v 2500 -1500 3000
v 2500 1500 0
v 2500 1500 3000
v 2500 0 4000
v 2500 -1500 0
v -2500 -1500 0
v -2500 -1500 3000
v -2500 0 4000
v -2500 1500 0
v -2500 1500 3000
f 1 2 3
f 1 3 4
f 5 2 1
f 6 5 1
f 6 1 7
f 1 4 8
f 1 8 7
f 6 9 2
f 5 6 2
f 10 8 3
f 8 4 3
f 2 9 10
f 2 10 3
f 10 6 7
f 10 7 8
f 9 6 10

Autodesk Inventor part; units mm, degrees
ref_plane "YZ Plane" through (0, 0, 0) normal (1, 0, 0) x (0, 1, 0)
ref_plane "XZ Plane" through (0, 0, 0) normal (0, 1, 0) x (-1, 0, 0)
ref_plane "XY Plane" through (0, 0, 0) normal (0, 0, 1) x (1, 0, 0)
sketch "草图1" plane through (0, 0, 0) normal (0, 0, 1) x (1, 0, 0)
  line L0 (-2500, 1500) -> (2500, 1500)
  line L1 (2500, 1500) -> (2500, -1500)
  line L2 (2500, -1500) -> (-2500, -1500)
  line L3 (-2500, -1500) -> (-2500, 1500)
  point P0 (0, 0)
  point P1 (2500, 0)
  point P2 (0, 1500)
  dimension "d0" = 5000
  dimension "d1" = 3000
extrude "拉伸1" add sketch "草图1" along normal blind 4000
sketch "草图2" plane through (2500, -1500, 0) normal (1, 0, 0) x (0, 0, -1)
  line L0 (-4000, 3000) -> (-4000, 0) projected
  line L1 (-4000, 1500) -> (-3000, 3000)
  line L2 (0, 3000) -> (-4000, 3000) projected
  line L3 (-4000, 1500) -> (-3000, 0)
  line L4 (0, 0) -> (-4000, 0) projected
  line L5 (-3000, 3000) -> (0, 3000)
  line L6 (0, 0) -> (-3000, 0)
  line L7 (0, 3000) -> (0, 0)
  point P0 (0, 1500)
  dimension "d4" = 1000
extrude "拉伸2" cut sketch "草图2" against normal through all contours L1 L2 L7 L4 L3 keep common part
properties part number "简单房"
